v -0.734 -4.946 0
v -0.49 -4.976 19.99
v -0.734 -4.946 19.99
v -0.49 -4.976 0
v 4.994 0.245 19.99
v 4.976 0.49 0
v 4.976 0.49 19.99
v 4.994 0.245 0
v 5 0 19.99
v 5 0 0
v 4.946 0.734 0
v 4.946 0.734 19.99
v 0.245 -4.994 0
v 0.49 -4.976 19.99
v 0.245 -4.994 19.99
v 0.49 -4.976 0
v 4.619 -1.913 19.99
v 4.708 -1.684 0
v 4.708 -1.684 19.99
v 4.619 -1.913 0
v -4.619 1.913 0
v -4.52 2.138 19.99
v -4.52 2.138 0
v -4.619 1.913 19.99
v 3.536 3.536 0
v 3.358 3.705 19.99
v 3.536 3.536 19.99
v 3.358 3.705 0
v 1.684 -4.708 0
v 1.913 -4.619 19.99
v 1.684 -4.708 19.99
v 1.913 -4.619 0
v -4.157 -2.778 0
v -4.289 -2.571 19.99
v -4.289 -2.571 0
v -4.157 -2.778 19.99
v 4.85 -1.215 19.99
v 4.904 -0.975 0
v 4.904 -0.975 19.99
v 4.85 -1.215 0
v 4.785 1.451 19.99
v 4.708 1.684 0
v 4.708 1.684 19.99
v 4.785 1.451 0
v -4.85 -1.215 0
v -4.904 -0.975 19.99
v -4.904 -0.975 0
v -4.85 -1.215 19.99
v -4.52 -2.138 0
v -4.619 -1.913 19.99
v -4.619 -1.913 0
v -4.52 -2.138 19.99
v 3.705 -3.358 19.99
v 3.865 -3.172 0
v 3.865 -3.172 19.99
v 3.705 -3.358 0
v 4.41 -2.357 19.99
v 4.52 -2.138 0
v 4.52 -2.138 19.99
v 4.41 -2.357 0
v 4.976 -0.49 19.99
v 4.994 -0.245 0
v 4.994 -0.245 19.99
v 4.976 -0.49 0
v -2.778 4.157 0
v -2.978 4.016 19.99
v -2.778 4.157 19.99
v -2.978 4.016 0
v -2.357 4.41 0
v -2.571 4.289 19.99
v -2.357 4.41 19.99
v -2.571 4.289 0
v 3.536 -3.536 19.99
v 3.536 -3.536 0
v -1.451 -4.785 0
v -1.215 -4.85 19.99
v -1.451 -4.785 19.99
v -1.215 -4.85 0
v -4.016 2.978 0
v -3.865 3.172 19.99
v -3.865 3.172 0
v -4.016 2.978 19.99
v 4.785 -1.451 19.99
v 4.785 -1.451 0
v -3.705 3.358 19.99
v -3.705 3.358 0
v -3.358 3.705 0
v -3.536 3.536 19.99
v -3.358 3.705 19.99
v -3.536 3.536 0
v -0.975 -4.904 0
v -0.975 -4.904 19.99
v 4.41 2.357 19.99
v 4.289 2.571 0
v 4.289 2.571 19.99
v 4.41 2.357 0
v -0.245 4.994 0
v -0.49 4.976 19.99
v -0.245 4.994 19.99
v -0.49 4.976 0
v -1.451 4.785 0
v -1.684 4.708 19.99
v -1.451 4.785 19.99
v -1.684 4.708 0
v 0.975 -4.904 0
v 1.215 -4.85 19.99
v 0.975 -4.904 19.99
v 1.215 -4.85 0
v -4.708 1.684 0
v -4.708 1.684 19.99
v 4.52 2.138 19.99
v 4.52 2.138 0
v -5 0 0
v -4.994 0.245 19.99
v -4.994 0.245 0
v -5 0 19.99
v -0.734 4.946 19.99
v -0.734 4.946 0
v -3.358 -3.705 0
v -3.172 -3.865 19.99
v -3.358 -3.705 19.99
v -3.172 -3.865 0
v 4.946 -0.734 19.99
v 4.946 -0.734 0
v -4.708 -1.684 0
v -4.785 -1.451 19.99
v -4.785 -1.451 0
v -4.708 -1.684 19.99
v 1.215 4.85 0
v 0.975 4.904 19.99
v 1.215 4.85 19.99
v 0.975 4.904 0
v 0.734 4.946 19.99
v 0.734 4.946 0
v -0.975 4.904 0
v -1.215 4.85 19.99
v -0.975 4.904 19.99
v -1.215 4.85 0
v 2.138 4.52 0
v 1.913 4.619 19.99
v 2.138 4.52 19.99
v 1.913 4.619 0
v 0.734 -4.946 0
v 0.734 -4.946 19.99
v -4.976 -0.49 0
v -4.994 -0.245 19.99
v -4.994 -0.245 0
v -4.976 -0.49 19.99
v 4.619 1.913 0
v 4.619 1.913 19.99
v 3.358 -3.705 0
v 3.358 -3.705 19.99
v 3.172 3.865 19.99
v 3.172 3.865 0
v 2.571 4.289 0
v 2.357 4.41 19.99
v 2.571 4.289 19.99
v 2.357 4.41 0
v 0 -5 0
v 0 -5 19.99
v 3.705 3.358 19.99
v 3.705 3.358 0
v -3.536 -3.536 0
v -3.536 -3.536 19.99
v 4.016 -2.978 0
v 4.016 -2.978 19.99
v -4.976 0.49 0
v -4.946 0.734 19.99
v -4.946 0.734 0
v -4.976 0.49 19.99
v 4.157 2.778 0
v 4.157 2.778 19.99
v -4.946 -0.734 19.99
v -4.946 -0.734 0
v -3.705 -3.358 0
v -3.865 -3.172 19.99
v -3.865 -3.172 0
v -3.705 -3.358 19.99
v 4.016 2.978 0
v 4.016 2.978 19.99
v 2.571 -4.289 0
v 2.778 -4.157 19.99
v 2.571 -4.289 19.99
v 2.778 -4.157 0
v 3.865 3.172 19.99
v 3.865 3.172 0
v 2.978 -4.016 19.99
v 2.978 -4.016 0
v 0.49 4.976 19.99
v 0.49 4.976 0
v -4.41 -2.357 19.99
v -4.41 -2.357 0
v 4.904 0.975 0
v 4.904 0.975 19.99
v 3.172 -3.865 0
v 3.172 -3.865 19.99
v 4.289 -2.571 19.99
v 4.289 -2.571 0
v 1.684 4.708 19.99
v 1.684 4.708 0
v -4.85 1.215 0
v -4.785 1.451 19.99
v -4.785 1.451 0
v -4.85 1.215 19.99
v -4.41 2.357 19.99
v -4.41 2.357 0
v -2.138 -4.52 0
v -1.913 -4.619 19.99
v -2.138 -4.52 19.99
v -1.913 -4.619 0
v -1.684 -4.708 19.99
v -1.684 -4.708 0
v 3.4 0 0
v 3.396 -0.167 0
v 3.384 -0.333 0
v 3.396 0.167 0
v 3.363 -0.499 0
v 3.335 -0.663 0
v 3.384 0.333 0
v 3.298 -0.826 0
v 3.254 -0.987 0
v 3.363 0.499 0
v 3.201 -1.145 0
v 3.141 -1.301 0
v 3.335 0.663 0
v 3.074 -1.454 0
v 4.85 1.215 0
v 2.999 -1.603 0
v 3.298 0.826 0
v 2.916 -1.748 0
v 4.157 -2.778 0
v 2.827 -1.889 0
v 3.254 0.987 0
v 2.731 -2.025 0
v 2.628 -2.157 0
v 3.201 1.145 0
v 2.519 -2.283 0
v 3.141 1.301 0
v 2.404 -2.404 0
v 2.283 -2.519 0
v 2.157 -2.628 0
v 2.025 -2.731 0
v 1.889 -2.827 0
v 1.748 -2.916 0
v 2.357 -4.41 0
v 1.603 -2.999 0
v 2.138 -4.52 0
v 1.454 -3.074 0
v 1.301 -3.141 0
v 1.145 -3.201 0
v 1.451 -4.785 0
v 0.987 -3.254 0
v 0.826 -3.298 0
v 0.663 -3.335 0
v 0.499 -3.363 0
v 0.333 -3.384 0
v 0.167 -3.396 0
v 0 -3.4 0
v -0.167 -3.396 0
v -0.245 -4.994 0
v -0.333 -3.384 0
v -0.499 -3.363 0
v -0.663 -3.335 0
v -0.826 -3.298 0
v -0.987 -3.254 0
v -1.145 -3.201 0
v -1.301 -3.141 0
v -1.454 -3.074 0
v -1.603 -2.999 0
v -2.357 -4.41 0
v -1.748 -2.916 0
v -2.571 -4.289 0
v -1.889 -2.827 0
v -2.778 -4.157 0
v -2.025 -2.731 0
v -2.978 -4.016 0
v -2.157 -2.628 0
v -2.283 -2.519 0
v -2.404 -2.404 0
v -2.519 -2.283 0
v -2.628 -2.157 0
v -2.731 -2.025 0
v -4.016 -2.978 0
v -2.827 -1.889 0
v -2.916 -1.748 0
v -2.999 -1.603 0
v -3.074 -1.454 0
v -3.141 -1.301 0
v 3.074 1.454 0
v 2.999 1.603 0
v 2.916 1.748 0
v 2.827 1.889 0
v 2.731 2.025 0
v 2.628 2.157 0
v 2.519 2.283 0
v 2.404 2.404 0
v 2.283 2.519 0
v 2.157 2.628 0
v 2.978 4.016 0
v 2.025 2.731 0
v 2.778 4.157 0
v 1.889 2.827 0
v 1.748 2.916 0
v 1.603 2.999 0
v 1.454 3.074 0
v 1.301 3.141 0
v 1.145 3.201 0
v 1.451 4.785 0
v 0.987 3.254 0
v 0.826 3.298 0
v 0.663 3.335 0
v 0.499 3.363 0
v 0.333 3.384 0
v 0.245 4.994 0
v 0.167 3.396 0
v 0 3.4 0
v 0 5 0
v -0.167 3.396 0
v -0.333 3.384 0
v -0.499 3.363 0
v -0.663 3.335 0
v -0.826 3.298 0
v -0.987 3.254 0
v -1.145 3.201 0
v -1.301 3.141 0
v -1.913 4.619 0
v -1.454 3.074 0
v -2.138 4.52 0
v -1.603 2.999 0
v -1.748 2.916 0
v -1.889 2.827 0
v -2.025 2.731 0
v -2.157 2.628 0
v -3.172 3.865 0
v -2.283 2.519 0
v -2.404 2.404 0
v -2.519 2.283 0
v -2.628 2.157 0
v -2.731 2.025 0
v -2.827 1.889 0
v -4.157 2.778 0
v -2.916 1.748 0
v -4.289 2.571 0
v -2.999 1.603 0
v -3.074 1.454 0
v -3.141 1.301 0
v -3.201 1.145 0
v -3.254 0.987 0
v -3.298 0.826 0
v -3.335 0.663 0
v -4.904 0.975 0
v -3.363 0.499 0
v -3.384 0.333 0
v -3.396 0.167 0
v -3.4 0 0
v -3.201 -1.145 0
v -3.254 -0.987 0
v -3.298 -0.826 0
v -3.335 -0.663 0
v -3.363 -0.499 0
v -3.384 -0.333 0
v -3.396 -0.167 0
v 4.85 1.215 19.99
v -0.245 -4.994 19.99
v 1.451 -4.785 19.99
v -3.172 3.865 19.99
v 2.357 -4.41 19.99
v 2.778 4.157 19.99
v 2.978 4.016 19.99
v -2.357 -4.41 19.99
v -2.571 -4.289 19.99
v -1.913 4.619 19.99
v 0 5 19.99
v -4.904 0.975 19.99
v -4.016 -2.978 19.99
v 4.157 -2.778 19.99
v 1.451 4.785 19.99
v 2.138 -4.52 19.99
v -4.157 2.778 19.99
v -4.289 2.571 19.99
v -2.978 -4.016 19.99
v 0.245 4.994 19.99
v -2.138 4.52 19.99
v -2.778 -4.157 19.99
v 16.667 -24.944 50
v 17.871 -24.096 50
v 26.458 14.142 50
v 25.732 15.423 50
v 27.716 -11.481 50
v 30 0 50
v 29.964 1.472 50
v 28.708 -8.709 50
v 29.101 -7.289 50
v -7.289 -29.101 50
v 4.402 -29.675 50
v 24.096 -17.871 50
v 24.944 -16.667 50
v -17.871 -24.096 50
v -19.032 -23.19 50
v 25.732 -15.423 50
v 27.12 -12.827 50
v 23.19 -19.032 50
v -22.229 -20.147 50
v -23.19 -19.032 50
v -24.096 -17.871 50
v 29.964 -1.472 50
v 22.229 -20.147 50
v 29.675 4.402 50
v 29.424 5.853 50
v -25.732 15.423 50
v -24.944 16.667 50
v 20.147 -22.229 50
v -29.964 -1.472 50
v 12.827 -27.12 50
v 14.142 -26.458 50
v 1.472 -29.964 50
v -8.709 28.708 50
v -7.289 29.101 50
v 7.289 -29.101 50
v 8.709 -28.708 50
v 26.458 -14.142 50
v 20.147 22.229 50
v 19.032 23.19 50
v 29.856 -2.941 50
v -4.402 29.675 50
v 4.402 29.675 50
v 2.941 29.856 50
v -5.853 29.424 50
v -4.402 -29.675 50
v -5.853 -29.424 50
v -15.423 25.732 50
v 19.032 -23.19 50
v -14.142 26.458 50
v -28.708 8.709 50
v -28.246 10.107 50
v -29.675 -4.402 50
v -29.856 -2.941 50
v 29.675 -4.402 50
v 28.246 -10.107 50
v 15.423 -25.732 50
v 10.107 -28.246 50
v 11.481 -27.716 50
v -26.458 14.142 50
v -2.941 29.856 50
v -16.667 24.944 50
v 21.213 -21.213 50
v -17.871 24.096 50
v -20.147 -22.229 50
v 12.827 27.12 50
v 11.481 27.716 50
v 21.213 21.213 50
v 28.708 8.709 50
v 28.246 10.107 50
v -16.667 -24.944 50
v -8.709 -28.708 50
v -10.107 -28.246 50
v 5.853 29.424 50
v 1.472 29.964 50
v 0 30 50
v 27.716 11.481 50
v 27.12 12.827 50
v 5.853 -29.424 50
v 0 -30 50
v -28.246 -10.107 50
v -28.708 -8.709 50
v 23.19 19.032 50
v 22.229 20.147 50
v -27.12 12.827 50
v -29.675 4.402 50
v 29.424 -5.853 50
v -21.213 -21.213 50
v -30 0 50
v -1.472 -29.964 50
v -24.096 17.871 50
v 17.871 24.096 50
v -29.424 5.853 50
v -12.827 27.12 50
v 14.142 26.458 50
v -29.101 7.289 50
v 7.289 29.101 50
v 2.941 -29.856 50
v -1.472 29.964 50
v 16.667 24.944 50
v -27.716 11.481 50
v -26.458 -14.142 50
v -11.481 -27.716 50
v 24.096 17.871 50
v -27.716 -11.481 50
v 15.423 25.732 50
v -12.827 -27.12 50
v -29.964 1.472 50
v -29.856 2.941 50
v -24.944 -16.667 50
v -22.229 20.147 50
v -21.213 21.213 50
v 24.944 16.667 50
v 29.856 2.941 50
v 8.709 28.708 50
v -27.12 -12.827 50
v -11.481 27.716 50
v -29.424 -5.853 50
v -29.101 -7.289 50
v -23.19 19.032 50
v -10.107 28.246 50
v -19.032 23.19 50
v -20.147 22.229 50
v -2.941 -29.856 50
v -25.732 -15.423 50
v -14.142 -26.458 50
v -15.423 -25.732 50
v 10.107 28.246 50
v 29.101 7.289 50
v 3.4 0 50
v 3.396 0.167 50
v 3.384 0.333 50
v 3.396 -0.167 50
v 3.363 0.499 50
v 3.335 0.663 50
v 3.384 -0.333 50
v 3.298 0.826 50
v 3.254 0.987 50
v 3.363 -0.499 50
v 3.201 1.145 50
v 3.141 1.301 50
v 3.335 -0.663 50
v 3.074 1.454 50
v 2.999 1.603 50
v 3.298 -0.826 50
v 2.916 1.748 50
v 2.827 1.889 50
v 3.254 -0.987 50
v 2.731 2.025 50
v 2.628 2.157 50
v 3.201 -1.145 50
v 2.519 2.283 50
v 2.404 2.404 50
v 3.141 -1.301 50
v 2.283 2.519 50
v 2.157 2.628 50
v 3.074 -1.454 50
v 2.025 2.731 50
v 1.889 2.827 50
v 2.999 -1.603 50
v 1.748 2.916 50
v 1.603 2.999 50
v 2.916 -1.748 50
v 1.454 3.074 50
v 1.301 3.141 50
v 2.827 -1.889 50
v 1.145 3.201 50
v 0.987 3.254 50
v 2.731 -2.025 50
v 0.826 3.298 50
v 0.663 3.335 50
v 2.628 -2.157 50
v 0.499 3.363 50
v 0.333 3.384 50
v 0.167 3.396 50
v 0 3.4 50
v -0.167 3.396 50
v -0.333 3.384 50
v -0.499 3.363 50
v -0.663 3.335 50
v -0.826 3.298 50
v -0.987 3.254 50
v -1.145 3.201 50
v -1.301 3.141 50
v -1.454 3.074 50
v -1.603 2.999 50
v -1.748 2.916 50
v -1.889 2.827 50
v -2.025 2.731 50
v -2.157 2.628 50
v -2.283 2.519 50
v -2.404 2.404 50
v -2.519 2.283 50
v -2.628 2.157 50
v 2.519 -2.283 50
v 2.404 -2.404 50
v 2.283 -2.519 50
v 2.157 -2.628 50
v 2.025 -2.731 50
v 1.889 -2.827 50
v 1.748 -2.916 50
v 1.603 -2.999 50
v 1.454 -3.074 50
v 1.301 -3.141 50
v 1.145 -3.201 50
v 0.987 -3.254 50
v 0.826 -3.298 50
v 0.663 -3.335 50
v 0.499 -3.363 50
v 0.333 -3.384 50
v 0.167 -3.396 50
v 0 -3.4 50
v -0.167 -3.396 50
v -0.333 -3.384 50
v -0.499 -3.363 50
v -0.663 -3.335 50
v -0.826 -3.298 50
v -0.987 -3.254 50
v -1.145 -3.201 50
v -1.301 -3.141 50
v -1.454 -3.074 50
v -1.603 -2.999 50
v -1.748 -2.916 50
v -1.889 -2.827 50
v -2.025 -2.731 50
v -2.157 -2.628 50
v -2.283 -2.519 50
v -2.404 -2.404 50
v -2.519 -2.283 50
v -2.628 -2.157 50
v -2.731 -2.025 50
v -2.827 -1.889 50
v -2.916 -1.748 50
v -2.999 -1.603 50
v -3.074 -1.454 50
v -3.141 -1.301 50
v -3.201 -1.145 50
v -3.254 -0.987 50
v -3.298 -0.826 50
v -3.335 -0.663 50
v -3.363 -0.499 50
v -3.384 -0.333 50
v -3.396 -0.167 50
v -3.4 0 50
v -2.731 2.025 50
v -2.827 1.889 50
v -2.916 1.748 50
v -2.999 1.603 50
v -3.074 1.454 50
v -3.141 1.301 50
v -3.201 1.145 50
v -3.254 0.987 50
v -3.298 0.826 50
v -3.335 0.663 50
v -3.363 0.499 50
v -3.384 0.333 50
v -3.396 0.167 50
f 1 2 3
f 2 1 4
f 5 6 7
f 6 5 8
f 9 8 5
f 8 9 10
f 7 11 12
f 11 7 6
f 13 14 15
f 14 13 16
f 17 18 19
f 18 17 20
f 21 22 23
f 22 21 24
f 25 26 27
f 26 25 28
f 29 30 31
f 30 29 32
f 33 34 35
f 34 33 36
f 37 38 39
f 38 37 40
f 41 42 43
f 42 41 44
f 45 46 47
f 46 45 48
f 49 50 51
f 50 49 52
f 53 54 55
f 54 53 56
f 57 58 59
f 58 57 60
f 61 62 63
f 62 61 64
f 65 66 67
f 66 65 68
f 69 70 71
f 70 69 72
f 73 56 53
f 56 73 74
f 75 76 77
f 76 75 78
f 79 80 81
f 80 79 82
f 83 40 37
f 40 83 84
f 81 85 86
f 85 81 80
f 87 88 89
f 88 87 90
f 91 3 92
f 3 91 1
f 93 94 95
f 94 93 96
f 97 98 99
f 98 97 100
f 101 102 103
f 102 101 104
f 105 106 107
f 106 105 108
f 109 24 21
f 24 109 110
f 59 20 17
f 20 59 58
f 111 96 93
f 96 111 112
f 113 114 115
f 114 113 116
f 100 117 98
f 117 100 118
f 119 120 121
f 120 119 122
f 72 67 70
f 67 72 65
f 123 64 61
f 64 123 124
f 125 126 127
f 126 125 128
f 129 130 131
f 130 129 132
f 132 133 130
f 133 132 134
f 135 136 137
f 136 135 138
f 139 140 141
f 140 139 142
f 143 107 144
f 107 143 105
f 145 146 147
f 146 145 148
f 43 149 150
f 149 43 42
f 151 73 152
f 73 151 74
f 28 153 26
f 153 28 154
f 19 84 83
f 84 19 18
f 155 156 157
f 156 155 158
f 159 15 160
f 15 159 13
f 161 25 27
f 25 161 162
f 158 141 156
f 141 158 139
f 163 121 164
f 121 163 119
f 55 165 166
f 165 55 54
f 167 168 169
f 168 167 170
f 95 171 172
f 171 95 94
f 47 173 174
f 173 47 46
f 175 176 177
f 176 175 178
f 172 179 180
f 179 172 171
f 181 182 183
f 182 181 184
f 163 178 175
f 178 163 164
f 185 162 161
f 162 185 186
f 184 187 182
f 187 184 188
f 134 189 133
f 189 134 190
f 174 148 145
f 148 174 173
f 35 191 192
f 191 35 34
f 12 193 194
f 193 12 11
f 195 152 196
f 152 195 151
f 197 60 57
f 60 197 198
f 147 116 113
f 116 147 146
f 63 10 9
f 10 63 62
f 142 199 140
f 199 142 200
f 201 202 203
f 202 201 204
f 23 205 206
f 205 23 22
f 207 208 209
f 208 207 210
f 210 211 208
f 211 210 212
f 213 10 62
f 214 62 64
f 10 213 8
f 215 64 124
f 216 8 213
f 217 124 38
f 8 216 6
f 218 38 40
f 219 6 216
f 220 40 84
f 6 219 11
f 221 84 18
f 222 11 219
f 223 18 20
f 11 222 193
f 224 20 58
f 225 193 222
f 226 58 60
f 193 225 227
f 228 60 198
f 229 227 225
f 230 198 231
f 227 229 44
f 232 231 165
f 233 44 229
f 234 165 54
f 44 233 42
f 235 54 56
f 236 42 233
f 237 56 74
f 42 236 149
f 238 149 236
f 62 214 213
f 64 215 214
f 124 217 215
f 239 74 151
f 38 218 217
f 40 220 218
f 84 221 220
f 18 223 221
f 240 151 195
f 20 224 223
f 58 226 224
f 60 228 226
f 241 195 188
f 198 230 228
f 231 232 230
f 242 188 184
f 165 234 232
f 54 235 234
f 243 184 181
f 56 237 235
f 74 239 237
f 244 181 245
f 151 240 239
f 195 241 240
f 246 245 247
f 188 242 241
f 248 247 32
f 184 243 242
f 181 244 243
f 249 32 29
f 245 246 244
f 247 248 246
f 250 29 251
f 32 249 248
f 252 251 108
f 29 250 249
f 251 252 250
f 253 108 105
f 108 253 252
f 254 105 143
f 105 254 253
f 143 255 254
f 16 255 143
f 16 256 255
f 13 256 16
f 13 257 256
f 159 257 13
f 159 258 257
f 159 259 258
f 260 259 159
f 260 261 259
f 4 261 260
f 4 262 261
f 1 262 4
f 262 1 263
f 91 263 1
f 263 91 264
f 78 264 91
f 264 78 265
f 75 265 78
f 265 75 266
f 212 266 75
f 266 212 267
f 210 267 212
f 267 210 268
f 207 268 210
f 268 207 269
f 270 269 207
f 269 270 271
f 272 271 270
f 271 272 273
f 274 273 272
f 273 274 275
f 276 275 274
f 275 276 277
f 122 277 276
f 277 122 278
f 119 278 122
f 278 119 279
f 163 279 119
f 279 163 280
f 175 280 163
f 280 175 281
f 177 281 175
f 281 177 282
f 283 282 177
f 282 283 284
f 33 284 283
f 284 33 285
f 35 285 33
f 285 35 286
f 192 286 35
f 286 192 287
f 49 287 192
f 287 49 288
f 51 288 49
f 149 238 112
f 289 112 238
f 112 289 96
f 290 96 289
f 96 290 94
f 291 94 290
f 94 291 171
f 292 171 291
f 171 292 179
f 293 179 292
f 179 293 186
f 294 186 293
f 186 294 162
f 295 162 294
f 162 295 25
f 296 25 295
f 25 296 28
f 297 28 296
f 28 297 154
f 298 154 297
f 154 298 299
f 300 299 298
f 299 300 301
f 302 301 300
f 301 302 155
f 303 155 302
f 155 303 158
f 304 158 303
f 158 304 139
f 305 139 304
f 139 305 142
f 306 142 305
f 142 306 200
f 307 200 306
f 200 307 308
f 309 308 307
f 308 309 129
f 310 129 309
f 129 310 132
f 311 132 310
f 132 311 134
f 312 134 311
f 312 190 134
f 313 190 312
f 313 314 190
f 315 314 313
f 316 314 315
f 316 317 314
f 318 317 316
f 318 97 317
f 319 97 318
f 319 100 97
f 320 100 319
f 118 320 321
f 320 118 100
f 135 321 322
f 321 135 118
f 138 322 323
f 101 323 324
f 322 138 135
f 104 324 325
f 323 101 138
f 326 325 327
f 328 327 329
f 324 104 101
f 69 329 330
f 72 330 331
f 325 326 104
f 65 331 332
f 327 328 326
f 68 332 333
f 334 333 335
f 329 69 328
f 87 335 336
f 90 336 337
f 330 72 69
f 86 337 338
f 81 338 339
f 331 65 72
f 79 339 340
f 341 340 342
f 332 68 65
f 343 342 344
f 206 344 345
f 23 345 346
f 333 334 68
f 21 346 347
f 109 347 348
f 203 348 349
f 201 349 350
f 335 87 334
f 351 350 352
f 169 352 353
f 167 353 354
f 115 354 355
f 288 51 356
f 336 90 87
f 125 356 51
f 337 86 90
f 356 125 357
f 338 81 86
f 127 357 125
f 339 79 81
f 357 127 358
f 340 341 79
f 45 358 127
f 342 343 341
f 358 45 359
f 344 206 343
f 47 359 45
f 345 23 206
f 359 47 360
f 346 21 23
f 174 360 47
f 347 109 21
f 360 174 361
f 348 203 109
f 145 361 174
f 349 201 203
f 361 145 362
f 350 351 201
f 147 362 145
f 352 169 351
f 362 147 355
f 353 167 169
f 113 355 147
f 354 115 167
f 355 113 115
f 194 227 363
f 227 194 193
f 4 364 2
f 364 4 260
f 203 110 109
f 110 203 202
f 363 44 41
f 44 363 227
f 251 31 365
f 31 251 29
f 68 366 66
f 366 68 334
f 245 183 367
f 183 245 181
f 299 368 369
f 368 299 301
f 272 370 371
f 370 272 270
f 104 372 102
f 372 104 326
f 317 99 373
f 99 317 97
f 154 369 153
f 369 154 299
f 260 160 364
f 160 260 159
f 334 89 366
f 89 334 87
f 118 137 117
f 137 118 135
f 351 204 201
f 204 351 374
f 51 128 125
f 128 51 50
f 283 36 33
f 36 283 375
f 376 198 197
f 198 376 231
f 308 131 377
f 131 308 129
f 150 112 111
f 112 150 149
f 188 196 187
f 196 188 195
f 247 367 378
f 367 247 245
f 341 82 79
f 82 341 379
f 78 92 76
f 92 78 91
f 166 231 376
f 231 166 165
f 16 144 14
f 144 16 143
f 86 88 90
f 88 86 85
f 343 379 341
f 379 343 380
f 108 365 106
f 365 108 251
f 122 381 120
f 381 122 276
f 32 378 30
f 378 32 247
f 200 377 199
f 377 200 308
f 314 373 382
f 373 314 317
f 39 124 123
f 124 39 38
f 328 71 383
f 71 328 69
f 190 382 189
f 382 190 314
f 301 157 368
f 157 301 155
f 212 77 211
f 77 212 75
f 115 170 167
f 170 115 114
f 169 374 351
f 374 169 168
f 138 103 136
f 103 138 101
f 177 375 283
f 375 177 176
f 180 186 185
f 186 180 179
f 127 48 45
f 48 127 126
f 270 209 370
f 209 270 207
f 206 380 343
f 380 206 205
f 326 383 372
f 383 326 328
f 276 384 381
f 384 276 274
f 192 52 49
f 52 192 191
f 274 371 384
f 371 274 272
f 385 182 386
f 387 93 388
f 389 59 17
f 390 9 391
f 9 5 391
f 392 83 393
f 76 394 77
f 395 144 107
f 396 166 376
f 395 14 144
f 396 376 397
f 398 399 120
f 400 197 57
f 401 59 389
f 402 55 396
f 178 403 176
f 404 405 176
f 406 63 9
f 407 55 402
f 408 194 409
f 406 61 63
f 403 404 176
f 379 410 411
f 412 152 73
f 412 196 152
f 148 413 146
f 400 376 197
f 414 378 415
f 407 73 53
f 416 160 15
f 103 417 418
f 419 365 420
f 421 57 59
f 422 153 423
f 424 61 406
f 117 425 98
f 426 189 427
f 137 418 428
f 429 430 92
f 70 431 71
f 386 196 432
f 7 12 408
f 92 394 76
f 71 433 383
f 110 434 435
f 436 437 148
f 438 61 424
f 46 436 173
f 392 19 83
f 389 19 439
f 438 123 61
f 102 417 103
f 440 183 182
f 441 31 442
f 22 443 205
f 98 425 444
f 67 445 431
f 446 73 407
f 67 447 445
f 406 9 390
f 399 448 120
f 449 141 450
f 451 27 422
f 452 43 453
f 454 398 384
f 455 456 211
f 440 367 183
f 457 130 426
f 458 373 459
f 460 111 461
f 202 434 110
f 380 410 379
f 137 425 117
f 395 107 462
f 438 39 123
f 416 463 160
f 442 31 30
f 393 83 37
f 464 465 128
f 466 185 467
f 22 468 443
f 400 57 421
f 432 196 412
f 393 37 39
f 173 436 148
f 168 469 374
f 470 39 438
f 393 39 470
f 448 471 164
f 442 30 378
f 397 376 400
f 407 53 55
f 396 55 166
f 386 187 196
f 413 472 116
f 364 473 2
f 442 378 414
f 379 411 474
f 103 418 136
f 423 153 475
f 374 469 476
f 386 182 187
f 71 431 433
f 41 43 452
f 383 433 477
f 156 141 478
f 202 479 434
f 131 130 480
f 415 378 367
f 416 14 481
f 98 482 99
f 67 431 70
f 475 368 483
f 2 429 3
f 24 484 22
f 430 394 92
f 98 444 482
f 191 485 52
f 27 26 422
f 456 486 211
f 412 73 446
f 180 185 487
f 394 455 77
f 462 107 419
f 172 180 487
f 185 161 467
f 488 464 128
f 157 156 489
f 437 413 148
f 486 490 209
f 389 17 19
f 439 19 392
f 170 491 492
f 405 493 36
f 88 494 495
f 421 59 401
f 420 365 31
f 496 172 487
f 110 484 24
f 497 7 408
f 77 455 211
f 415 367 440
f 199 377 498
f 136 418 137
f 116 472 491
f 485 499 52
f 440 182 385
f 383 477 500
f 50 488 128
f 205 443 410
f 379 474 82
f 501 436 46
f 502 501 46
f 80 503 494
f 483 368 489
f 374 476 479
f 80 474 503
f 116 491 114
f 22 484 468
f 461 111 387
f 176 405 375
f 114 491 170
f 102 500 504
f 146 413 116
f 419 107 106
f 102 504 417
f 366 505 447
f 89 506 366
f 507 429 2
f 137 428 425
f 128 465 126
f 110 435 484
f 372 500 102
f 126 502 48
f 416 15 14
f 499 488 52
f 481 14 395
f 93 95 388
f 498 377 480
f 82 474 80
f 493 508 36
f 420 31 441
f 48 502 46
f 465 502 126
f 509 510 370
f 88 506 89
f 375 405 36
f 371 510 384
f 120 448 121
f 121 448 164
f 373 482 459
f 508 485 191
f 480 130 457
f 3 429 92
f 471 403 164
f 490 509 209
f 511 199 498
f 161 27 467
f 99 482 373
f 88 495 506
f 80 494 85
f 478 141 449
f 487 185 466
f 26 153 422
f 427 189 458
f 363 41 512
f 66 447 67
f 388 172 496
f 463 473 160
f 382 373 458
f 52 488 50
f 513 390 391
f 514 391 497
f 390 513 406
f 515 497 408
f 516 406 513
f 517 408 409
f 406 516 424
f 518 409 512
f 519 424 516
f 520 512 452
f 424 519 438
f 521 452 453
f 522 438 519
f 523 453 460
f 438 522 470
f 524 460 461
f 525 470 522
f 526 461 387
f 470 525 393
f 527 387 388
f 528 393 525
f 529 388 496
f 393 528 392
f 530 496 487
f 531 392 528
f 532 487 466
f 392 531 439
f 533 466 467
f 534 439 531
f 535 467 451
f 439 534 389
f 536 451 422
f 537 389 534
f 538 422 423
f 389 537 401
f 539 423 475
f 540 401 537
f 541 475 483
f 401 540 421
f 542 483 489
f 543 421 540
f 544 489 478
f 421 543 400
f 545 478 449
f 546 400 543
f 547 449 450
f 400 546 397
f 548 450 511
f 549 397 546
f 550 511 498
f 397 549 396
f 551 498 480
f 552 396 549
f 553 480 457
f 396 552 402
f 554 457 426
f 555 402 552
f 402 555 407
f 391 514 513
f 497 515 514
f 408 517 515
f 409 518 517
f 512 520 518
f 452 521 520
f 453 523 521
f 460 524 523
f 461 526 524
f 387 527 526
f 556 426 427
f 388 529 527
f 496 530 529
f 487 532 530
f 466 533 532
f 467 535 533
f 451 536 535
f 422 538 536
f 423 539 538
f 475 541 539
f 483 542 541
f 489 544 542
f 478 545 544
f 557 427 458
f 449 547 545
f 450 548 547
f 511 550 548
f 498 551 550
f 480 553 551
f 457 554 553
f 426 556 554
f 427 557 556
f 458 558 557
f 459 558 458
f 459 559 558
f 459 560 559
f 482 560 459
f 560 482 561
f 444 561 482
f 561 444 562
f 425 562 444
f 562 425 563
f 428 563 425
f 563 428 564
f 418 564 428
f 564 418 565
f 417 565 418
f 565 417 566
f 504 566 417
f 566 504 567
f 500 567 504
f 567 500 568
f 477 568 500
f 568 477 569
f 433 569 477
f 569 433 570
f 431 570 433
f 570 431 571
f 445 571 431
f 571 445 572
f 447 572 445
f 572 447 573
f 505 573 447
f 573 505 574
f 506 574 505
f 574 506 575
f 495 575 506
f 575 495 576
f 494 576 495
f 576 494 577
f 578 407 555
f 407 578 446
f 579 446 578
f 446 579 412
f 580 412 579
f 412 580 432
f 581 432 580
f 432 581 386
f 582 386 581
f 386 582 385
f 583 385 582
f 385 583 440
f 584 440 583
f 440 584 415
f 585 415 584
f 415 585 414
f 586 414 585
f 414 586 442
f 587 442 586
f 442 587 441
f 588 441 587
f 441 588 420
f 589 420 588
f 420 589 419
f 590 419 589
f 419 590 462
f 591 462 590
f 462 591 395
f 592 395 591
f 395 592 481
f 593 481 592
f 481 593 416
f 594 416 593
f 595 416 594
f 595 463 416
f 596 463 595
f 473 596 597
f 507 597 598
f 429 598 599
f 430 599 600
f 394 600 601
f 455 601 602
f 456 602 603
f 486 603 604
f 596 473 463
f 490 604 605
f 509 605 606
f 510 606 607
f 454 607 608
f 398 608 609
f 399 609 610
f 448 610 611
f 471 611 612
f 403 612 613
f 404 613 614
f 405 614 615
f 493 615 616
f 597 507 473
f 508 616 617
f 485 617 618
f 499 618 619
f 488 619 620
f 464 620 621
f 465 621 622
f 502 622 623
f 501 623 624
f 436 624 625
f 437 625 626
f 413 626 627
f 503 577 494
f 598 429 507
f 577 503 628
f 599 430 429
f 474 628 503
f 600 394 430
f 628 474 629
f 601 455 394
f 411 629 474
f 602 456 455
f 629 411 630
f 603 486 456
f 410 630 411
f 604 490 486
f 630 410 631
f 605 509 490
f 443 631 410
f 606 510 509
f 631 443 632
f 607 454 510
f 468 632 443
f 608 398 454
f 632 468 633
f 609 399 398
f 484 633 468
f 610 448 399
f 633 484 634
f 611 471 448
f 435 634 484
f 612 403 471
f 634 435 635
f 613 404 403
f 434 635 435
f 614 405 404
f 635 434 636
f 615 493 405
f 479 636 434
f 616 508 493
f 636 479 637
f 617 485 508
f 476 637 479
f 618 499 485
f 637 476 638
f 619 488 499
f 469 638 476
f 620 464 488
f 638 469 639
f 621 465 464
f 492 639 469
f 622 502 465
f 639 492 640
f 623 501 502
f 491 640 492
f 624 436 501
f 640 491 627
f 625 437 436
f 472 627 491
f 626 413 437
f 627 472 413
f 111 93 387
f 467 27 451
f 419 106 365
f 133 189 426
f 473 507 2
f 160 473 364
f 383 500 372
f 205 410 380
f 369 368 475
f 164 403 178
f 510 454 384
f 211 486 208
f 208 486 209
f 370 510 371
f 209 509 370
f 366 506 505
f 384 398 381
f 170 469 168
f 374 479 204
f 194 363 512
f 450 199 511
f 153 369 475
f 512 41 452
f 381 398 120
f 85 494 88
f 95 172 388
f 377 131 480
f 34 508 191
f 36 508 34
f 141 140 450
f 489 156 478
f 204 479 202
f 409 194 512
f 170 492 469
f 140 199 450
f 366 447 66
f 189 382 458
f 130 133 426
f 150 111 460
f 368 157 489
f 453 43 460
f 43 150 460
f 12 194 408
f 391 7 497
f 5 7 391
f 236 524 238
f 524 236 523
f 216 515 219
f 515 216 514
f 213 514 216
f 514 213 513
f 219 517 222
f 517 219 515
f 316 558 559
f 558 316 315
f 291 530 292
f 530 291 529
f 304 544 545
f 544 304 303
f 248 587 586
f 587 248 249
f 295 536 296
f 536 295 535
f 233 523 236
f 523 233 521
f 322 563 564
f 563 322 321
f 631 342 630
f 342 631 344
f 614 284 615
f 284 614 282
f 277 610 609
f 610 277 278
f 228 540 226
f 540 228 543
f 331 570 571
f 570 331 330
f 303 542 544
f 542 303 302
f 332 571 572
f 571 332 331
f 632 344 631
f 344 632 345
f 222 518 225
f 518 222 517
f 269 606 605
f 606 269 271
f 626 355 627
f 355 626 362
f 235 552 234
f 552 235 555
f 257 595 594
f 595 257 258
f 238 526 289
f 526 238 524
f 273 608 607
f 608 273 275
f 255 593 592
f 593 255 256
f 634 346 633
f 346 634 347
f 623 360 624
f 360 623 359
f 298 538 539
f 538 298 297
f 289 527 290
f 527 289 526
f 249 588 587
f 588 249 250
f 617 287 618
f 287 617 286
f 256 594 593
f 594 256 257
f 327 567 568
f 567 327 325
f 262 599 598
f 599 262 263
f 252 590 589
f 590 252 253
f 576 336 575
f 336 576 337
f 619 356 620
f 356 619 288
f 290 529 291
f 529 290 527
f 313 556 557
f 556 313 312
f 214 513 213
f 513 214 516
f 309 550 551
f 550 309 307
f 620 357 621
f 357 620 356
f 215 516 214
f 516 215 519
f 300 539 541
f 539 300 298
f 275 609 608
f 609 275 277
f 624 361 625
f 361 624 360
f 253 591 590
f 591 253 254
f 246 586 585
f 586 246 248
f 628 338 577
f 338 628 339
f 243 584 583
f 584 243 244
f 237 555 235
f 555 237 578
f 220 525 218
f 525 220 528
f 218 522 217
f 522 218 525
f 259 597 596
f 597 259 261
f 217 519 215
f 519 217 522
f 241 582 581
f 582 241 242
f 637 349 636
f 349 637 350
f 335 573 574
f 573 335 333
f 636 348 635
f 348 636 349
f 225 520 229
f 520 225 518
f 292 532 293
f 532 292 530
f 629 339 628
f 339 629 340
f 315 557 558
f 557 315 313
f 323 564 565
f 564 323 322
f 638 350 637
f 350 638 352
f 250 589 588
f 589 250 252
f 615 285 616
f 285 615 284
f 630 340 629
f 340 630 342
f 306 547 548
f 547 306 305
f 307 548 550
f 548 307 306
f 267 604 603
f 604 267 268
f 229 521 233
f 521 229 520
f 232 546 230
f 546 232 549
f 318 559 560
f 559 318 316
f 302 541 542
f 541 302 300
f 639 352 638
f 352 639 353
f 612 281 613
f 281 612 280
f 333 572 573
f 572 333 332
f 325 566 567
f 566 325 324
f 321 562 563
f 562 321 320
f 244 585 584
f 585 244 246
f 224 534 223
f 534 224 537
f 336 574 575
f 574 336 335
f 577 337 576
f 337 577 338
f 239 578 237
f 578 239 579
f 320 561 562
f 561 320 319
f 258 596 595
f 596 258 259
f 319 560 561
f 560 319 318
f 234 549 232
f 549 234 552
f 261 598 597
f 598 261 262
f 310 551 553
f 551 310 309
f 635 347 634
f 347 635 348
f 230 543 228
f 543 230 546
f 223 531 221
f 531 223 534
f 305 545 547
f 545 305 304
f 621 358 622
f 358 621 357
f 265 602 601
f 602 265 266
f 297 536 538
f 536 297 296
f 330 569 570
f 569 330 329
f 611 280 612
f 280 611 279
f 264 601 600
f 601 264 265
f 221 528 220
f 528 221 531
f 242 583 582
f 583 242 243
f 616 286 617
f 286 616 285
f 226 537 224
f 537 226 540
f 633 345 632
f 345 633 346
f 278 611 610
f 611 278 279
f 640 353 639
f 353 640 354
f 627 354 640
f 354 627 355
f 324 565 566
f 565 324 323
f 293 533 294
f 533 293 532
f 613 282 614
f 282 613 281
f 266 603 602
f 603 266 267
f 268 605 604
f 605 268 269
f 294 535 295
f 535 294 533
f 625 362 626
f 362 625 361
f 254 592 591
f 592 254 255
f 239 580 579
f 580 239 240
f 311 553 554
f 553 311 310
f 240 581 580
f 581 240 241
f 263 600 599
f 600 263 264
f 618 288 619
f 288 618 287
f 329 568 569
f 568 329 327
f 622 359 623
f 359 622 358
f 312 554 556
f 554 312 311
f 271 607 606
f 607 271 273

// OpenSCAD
// Small lab funnel, printed upright (wide opening at top)
// All dimensions in mm

// ---- Parameters ----
spout_od      = 10;    // spout outer diameter
spout_h       = 20;    // spout height (z = 0 to 20)
cone_od_top   = 60;    // cone outer diameter at rim
cone_h        = 30;    // cone height (z = 20 to 50)
wall          = 1.6;   // wall thickness everywhere
eps           = 0.5;   // overshoot for clean cuts

$fn = 128;

// ---- Derived ----
bore = spout_od - 2 * wall;   // 6.8 mm spout bore

// ---- Model ----
difference() {
    union() {
        // Spout
        cylinder(h = spout_h, d = spout_od);
        // Cone (slightly overlapping spout for a solid union)
        translate([0, 0, spout_h - 0.01])
            cylinder(h = cone_h + 0.01, d1 = spout_od, d2 = cone_od_top);
    }
    // Through-bore from bottom up past the rim
    translate([0, 0, -eps])
        cylinder(h = spout_h + cone_h + 2 * eps, d = bore);
}
